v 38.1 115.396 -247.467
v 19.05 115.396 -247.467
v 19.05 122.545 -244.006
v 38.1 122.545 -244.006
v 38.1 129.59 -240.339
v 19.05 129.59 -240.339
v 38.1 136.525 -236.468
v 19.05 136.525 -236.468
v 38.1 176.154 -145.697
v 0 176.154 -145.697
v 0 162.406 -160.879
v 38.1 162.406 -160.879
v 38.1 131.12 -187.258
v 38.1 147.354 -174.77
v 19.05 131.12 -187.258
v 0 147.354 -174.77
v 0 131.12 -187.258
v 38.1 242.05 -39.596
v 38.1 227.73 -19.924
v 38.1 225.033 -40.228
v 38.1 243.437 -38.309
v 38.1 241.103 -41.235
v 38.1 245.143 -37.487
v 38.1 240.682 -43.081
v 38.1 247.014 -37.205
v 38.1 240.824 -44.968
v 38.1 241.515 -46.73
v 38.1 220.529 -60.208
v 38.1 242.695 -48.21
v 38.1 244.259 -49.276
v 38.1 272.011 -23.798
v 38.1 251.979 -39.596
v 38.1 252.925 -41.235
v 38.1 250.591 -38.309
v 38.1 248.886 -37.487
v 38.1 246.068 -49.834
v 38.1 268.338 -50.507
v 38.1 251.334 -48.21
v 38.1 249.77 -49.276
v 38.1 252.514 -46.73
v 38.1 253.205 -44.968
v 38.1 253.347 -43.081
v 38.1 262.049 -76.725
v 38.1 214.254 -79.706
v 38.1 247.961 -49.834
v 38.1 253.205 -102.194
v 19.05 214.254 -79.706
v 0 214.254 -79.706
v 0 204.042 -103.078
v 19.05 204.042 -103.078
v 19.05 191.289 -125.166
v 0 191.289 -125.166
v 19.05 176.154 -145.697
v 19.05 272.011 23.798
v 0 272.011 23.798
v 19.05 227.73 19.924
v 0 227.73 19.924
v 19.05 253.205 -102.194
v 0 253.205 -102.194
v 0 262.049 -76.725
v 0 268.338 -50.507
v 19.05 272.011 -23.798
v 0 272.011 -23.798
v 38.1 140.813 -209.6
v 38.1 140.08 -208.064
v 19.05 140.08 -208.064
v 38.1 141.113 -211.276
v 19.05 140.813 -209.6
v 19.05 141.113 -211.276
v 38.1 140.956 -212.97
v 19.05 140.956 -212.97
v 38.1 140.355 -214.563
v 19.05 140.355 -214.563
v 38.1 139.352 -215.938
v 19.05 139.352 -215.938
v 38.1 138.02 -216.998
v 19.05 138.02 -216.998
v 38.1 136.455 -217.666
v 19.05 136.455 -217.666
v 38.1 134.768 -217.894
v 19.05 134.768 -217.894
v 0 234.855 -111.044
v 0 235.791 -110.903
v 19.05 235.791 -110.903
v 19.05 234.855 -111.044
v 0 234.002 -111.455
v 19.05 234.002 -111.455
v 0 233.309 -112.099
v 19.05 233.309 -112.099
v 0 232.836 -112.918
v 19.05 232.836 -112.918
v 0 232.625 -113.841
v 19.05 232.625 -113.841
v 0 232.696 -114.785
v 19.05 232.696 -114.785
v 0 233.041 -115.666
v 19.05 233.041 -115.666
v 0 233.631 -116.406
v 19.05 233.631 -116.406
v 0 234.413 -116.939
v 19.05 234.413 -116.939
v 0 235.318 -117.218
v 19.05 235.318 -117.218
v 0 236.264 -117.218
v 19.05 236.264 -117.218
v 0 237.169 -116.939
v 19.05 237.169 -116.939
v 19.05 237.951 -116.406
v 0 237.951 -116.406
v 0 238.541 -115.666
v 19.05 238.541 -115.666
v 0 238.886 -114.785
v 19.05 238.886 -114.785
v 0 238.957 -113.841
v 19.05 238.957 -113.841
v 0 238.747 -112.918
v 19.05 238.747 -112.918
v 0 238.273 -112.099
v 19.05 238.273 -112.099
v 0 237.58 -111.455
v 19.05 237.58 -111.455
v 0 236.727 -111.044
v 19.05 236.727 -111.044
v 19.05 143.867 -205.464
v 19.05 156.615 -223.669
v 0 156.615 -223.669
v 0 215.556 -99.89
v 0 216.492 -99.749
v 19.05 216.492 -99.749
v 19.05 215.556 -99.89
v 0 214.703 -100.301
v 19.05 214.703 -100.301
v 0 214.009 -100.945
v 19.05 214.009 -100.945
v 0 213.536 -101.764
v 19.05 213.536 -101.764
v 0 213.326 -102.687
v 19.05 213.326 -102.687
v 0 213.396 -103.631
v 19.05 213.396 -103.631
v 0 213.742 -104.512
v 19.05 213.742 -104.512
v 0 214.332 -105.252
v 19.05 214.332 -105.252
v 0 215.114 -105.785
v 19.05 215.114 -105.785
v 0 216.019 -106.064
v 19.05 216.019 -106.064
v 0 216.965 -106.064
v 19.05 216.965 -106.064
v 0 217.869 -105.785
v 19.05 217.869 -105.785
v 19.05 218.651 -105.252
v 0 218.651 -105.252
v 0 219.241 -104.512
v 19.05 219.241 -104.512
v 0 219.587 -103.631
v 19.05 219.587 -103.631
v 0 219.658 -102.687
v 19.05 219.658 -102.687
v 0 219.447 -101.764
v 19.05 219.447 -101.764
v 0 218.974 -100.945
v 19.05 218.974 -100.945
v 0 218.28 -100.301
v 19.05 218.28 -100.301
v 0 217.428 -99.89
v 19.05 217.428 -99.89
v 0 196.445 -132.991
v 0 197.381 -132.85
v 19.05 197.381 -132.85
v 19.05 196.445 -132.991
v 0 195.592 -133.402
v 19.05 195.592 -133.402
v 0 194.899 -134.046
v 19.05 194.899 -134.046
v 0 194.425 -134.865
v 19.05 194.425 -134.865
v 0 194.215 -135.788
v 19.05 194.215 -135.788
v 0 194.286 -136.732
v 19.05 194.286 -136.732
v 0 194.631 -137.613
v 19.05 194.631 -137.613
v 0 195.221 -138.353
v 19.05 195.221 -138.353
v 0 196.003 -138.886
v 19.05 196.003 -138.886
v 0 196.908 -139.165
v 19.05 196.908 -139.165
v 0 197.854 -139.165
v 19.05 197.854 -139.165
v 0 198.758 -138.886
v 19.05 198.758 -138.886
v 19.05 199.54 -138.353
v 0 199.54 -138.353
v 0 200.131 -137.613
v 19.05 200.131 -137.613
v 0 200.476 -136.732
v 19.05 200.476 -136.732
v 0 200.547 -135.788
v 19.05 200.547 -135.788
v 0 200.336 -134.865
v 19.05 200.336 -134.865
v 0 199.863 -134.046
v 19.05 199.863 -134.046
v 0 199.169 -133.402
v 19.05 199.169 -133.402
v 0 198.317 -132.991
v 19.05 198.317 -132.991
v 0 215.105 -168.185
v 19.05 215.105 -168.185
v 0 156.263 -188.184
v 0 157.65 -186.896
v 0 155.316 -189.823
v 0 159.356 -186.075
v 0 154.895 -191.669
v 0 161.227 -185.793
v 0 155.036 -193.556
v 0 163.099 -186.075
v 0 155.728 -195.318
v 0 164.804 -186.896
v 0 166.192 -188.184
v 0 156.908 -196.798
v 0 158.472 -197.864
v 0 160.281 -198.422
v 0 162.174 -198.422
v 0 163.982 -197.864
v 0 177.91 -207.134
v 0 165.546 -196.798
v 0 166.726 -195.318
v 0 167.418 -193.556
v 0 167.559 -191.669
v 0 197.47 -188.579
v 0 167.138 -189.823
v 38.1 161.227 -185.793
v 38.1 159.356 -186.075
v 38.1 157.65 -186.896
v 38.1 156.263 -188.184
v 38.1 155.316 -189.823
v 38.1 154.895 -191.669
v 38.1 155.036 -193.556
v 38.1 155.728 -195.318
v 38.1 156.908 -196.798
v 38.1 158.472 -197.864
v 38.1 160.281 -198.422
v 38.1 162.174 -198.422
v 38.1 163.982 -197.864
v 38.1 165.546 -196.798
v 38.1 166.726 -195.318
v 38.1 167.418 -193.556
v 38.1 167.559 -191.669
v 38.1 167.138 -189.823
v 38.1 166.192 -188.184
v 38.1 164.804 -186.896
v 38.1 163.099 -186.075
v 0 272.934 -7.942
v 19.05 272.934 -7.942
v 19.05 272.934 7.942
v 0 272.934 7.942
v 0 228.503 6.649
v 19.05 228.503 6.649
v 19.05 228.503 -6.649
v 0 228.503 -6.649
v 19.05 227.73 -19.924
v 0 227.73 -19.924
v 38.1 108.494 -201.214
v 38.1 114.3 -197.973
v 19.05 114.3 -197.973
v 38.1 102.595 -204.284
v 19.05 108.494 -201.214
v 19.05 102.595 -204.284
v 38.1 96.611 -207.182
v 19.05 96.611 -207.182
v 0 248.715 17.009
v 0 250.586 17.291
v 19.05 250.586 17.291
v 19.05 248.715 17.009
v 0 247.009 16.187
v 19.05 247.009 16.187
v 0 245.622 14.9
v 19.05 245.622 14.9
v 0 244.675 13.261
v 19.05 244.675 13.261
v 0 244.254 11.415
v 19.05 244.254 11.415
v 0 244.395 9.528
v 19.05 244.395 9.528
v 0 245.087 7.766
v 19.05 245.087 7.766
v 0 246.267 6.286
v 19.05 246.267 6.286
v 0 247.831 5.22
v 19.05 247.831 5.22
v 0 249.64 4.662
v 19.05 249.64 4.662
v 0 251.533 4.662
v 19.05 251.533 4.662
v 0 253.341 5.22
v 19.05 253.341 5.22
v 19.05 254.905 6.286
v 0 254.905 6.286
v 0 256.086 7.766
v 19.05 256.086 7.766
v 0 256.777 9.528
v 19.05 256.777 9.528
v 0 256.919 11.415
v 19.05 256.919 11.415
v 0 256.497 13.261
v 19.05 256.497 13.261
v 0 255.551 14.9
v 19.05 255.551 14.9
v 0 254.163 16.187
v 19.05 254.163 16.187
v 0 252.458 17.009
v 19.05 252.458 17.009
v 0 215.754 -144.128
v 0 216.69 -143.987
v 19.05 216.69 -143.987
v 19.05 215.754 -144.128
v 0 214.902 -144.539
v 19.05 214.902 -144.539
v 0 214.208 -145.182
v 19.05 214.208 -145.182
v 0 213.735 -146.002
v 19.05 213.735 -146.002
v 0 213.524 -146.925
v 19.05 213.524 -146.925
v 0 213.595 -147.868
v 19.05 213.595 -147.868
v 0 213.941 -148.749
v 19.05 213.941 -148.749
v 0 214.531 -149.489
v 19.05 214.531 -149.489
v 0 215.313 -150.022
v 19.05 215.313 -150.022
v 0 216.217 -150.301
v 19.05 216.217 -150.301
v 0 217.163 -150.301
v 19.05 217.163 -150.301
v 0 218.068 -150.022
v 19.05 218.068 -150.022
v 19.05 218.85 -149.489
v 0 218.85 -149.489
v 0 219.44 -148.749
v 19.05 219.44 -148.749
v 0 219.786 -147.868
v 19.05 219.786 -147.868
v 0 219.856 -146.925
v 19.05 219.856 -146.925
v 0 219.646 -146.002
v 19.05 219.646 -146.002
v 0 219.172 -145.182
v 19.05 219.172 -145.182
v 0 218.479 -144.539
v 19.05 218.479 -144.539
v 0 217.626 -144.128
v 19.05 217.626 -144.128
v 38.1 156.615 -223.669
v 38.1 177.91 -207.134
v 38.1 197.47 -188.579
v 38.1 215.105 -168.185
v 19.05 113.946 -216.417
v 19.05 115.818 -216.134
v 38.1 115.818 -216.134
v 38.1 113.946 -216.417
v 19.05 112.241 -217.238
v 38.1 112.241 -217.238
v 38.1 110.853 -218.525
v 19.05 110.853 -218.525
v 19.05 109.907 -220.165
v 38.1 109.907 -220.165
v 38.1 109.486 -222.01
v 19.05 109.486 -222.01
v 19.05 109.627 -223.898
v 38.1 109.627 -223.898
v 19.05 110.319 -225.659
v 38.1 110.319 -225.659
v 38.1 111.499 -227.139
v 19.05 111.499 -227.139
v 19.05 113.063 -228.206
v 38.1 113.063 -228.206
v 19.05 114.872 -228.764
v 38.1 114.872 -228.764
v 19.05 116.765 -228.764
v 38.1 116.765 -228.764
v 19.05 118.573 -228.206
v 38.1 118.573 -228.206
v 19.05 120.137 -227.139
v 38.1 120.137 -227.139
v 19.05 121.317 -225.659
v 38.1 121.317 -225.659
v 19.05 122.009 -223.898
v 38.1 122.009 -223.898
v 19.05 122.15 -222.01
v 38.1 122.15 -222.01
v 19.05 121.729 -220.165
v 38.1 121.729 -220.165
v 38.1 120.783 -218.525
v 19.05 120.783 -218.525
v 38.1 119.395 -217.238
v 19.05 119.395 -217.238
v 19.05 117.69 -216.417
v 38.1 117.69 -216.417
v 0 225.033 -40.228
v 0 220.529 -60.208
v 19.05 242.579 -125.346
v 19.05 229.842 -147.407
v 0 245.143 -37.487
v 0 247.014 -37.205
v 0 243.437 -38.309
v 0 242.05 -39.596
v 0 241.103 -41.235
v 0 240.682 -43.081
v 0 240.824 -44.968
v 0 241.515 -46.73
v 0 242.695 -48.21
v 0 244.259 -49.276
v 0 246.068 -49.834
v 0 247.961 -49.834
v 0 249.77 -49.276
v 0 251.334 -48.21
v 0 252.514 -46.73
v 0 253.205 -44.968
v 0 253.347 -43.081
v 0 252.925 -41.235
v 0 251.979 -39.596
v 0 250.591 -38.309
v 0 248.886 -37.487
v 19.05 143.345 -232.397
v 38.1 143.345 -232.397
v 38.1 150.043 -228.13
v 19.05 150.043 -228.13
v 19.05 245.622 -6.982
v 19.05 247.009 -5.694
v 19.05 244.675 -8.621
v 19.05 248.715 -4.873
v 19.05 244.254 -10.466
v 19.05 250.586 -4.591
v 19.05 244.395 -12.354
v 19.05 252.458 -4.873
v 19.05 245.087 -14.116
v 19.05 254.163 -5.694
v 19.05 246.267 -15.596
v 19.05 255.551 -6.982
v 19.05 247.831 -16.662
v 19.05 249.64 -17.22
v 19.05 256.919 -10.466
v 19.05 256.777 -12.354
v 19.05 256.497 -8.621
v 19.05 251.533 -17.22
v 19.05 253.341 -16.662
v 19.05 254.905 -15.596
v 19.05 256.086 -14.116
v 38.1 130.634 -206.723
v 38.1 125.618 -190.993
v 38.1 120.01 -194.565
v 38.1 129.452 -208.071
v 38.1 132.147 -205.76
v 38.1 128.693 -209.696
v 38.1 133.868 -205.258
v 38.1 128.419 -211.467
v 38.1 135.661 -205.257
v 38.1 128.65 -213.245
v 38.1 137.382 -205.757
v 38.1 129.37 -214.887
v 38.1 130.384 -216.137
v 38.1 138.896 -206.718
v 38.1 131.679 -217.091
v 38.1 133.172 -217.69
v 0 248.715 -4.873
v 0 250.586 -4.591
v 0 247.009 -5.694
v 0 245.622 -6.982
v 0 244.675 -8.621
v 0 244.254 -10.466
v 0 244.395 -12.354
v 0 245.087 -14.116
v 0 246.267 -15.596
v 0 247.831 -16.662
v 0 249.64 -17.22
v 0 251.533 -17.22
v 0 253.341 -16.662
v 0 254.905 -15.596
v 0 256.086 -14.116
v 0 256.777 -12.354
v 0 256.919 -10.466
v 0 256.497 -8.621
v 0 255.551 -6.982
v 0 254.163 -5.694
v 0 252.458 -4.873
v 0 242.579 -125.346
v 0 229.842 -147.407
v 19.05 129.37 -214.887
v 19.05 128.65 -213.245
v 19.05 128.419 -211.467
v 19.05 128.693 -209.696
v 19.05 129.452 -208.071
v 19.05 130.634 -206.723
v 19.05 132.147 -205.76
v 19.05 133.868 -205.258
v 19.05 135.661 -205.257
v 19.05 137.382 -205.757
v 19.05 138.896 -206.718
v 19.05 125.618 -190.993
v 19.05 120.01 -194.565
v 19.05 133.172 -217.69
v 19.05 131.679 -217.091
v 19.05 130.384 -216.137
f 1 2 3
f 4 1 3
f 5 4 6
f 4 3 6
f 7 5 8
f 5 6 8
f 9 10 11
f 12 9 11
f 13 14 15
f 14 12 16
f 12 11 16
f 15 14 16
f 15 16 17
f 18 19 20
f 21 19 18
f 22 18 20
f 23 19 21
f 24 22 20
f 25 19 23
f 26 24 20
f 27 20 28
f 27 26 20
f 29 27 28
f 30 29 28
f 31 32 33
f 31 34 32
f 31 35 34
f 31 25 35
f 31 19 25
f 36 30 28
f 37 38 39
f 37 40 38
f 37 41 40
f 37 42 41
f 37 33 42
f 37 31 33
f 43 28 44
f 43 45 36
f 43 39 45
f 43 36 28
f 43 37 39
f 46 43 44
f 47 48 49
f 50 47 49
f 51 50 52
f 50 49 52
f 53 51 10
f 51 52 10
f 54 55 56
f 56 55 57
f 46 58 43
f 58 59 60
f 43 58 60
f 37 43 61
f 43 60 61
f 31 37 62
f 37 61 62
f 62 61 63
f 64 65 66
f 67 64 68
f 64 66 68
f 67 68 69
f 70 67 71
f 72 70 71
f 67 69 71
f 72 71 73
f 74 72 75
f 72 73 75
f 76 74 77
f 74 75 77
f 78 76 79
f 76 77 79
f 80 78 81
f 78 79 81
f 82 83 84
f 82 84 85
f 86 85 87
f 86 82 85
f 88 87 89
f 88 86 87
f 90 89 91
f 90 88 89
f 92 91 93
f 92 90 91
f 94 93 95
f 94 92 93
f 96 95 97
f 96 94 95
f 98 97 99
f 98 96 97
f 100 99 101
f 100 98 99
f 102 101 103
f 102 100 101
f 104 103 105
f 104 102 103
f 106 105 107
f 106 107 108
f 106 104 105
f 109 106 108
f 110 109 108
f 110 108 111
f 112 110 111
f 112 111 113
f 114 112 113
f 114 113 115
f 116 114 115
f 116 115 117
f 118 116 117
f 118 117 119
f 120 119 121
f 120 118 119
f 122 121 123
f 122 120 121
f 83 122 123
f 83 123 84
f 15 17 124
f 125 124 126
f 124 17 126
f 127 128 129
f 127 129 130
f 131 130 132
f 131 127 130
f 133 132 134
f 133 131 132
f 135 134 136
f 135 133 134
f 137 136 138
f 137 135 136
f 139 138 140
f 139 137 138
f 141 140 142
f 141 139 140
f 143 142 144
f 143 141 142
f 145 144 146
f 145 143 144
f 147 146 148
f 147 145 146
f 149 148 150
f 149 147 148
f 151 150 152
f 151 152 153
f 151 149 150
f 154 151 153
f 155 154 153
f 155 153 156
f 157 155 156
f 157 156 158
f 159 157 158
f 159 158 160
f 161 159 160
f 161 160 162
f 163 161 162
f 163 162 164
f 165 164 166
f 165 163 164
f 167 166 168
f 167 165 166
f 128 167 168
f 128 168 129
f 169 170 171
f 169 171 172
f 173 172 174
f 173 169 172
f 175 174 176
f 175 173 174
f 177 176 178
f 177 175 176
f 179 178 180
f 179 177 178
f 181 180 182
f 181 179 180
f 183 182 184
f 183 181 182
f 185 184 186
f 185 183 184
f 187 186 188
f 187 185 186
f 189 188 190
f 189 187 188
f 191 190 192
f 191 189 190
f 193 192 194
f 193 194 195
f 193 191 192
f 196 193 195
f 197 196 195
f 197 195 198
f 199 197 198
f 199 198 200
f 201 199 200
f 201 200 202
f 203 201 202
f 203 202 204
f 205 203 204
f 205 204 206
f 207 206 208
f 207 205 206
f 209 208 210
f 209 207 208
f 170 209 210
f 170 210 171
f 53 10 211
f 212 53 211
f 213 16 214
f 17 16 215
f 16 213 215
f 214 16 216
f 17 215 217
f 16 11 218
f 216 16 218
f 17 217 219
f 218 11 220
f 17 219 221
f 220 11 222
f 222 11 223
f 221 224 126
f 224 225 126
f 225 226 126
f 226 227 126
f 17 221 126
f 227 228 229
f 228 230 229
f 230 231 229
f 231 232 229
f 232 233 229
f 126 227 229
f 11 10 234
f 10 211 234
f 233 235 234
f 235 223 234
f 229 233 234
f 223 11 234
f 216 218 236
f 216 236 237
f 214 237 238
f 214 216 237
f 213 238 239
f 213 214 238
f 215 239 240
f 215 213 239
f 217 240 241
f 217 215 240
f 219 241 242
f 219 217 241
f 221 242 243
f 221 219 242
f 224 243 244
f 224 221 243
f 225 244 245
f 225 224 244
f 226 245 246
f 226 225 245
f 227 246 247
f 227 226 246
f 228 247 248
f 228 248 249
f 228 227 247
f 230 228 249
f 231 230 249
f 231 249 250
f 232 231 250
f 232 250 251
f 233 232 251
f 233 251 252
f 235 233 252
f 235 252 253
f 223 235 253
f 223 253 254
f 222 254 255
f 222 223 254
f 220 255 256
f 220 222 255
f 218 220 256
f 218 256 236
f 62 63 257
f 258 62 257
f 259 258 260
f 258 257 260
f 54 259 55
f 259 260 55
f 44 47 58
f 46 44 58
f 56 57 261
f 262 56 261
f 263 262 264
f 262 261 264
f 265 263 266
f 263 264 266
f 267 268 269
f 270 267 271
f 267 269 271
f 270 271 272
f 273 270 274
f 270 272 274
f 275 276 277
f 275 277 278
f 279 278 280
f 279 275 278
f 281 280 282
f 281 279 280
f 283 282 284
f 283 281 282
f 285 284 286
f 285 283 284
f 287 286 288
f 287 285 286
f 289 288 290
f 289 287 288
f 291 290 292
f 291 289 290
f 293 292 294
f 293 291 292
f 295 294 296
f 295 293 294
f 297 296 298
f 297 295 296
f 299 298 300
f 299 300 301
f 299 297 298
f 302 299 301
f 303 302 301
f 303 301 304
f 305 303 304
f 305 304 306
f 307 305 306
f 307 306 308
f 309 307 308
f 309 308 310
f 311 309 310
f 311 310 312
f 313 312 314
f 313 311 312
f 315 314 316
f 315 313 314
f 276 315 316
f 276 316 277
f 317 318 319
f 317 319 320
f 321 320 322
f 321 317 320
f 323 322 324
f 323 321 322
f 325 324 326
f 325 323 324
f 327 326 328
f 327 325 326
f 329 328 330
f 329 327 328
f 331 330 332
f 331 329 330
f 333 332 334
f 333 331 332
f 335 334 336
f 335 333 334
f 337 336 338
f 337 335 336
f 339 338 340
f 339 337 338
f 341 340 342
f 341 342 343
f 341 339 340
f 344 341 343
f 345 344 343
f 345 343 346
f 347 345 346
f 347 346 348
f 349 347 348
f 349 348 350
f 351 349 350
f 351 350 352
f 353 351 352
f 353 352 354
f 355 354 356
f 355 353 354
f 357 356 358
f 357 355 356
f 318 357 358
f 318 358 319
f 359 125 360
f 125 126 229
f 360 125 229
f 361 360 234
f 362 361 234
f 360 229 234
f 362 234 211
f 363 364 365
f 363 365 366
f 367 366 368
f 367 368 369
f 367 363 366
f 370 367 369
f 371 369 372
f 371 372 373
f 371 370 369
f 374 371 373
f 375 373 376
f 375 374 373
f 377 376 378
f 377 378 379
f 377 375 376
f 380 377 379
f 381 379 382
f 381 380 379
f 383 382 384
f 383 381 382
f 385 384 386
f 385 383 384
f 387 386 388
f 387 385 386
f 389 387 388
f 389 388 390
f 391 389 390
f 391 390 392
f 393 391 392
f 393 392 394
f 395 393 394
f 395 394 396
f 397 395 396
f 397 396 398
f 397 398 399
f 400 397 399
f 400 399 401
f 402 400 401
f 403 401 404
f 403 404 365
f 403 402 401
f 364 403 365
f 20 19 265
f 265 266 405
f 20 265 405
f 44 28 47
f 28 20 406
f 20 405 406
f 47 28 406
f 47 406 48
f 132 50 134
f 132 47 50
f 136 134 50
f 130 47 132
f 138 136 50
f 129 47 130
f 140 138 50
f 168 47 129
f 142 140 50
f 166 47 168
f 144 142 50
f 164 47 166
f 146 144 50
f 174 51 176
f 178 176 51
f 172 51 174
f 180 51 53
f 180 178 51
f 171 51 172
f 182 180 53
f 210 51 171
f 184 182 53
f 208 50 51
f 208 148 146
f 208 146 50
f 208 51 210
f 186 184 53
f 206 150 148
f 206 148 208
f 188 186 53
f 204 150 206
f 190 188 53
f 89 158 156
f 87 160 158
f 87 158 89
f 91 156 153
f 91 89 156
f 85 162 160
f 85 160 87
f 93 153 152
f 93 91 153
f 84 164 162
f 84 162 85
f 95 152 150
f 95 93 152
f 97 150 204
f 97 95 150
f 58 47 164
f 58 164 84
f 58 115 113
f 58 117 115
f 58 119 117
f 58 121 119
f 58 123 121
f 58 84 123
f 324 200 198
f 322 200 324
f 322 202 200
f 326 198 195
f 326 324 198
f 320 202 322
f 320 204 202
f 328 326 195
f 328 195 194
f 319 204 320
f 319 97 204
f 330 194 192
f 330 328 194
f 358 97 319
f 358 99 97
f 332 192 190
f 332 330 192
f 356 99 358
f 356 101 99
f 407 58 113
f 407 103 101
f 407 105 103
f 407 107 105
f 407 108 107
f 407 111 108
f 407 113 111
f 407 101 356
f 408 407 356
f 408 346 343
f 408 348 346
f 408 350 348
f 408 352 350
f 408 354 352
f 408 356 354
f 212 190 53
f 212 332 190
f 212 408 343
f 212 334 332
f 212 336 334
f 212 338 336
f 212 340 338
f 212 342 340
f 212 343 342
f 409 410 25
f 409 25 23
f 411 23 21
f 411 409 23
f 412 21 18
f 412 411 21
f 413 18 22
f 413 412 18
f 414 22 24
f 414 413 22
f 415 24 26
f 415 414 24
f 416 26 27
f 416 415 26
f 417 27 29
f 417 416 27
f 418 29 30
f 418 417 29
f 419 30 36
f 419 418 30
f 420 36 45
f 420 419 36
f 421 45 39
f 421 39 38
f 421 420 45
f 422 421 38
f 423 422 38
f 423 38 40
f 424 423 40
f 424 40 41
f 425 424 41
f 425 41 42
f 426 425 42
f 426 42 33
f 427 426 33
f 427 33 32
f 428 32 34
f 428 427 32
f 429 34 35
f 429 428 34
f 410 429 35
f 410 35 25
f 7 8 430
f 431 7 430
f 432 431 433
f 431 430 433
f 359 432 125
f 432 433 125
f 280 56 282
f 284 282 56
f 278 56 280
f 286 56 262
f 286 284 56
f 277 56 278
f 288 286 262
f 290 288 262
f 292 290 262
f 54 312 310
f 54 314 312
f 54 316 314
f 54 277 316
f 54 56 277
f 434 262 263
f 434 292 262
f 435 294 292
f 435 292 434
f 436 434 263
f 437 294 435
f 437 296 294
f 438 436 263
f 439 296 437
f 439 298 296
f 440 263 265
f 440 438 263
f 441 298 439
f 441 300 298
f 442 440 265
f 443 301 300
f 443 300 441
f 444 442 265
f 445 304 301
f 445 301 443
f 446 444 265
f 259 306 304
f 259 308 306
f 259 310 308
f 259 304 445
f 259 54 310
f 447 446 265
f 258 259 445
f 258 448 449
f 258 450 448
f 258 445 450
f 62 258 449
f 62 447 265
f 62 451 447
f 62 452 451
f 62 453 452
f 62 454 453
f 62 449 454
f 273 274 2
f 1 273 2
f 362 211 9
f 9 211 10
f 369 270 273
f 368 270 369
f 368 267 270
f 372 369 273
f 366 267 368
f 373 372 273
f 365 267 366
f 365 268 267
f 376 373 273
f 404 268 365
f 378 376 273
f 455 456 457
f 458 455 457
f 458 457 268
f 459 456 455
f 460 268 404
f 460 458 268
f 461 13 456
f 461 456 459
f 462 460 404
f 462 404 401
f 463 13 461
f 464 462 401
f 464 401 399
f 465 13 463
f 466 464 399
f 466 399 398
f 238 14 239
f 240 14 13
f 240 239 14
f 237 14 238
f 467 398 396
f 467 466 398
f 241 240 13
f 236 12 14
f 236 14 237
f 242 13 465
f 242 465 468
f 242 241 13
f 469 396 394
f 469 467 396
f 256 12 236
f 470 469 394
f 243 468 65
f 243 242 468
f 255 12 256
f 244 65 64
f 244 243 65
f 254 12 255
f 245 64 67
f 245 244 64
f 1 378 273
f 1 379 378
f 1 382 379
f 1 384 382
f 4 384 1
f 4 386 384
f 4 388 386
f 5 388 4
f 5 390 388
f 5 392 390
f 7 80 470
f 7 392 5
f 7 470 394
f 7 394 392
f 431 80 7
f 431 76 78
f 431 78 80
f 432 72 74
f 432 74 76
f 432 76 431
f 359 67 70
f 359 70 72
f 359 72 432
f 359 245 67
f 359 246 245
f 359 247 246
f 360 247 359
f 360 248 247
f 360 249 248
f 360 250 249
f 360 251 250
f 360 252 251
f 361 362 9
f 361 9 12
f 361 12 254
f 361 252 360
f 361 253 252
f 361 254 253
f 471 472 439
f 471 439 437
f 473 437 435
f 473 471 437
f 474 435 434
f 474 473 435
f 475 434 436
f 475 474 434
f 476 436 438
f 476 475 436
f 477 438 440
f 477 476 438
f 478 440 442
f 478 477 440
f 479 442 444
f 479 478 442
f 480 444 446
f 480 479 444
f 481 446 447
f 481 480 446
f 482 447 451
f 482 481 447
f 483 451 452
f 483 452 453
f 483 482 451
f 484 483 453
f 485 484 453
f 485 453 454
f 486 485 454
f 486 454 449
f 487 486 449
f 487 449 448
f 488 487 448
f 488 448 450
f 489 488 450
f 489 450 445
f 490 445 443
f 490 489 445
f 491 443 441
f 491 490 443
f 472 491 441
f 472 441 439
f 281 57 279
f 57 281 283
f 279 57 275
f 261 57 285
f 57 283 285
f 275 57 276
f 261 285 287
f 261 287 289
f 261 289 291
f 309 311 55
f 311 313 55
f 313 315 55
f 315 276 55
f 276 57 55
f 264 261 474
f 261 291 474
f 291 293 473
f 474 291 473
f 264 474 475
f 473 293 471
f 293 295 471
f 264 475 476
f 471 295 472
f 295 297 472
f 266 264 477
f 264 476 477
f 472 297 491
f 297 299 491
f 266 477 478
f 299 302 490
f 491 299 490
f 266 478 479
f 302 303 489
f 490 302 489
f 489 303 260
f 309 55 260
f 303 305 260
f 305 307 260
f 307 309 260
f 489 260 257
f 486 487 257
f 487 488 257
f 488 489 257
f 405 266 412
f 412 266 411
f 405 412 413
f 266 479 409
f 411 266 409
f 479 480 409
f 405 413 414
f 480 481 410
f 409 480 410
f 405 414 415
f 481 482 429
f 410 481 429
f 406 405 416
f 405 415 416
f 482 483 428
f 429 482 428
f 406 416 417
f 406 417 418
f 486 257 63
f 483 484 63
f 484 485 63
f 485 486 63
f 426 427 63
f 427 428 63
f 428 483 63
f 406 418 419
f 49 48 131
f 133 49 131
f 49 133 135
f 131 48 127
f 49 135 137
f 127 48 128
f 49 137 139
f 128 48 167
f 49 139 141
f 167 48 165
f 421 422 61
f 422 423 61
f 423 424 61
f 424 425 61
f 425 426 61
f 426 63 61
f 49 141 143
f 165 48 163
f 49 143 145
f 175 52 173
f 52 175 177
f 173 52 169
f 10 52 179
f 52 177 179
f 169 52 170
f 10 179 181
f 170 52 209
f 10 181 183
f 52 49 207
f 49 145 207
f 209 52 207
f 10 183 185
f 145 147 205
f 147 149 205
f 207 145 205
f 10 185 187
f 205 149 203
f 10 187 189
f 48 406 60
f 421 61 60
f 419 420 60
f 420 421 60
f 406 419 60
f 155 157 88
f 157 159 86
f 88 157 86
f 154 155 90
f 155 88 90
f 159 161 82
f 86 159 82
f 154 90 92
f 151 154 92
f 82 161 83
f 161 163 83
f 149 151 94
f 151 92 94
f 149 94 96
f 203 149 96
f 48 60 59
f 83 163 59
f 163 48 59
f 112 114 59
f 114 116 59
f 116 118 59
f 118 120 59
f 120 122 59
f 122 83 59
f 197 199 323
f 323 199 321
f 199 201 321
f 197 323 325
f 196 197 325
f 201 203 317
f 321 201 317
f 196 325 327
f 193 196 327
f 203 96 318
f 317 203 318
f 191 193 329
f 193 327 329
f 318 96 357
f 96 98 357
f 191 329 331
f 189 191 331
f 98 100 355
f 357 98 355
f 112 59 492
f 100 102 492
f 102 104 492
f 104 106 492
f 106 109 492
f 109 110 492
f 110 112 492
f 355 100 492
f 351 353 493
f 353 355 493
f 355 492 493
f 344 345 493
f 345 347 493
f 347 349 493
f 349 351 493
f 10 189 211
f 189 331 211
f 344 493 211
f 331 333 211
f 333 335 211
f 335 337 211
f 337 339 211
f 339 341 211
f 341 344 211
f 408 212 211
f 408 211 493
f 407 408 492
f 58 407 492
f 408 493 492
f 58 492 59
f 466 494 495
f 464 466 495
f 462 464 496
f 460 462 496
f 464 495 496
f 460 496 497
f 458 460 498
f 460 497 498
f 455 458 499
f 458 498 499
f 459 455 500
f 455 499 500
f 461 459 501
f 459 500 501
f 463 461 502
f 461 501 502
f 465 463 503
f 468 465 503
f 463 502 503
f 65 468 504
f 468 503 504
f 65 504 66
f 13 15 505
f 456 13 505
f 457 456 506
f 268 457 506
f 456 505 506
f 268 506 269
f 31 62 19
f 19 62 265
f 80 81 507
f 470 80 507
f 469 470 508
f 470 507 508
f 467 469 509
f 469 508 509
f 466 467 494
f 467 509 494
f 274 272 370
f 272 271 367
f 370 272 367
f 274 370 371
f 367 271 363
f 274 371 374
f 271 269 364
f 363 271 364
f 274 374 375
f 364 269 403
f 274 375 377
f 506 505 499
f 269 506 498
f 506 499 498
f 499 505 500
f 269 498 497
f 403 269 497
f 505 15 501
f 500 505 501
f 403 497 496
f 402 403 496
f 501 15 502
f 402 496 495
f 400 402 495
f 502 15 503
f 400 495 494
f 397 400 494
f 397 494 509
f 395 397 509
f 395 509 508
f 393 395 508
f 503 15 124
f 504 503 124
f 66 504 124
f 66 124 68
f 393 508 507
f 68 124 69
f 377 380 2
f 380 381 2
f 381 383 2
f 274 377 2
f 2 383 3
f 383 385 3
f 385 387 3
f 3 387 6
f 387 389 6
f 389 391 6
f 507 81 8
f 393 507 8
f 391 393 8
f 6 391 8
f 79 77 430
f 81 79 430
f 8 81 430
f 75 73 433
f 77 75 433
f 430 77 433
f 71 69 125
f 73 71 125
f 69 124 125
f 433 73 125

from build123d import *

# Parameters (mm, degrees)
SKETCH1_R             = 6.35
BOSS_EXTRUDE9_DEPTH   = 38.1
BOSS_EXTRUDE9_2_DEPTH = 38.1
SKETCH1_8_R           = 6.35
SKETCH1_8_R_2         = 3.175
BOSS_EXTRUDE10_DEPTH  = 19.05
BOSS_EXTRUDE12_START  = 19.05
SKETCH1_10_R          = 6.35
BOSS_EXTRUDE12_DEPTH  = 19.05


with BuildPart() as part:
    # Sketch1 → Boss-Extrude9 (new body)
    with BuildSketch(Plane(origin=(0, 0, 0), x_dir=(0, 0, -1), z_dir=(1, 0, 0))):
        with BuildLine():
            ThreePointArc((19.923802792, 227.730107984), (50.268386101, 223.004594928), (79.705751984, 214.254412092))
            Line((79.705751984, 214.254412092), (102.193829352, 253.204904657))
            ThreePointArc((102.193829352, 253.204904657), (63.69375462, 265.517246375), (23.797875557, 272.010962314))
            Line((23.797875557, 272.010962314), (19.923802792, 227.730107984))
        make_face()
        with Locations(Location((43.555304163, 247.014404649, 0), (0, 0, 180))):
            Circle(SKETCH1_R, mode=Mode.SUBTRACT)
    extrude(amount=BOSS_EXTRUDE9_DEPTH)

    # Sketch1<8> → Boss-Extrude10 (add)
    # profile 1 of 2: a face of its own
    with BuildSketch(Plane(origin=(0, 0, 0), x_dir=(0, 0, -1), z_dir=(1, 0, 0))):
        with BuildLine():
            ThreePointArc((-19.923802792, 227.730107984), (0, 228.6), (19.923802792, 227.730107984))
            Line((19.923802792, 227.730107984), (23.797875557, 272.010962314))
            ThreePointArc((23.797875557, 272.010962314), (0, 273.05), (-23.797875557, 272.010962314))
            Line((-23.797875557, 272.010962314), (-19.923802792, 227.730107984))
        make_face()
        with Locations(Location((10.940832836, 250.586270178, 0), (0, 0, 180))):
            Circle(SKETCH1_8_R, mode=Mode.SUBTRACT)
        with Locations(Location((-10.940832836, 250.586270178, 0), (0, 0, 180))):
            Circle(SKETCH1_8_R, mode=Mode.SUBTRACT)
    # profile 2 of 2: a face of its own
    with BuildSketch(Plane(origin=(0, 0, 0), x_dir=(0, 0, -1), z_dir=(1, 0, 0))):
        with BuildLine():
            Line((102.193829352, 253.204904657), (79.705751984, 214.254412092))
            ThreePointArc((79.705751984, 214.254412092), (114.3, 197.973407305), (145.696887752, 176.154412092))
            Line((145.696887752, 176.154412092), (168.18496512, 215.104904657))
            ThreePointArc((168.18496512, 215.104904657), (136.525, 236.468236503), (102.193829352, 253.204904657))
        make_face()
        with Locations(Location((102.924280642, 216.491743747, 0), (0, 0, 180))):
            Circle(SKETCH1_8_R_2, mode=Mode.SUBTRACT)
        with Locations(Location((114.078247165, 235.791024914, 0), (0, 0, 180))):
            Circle(SKETCH1_8_R_2, mode=Mode.SUBTRACT)
        with Locations(Location((147.161893977, 216.690172521, 0), (0, 0, 180))):
            Circle(SKETCH1_8_R_2, mode=Mode.SUBTRACT)
        with Locations(Location((136.025209473, 197.380913576, 0), (0, 0, 180))):
            Circle(SKETCH1_8_R_2, mode=Mode.SUBTRACT)
    extrude(amount=BOSS_EXTRUDE10_DEPTH)


with BuildPart() as body_2:
    # Sketch1 → Boss-Extrude9 2 (new body)
    with BuildSketch(Plane(origin=(0, 0, 0), x_dir=(0, 0, -1), z_dir=(1, 0, 0))):
        with BuildLine():
            ThreePointArc((145.696887752, 176.154412092), (167.993451318, 155.035996834), (187.258157324, 131.11957335))
            Line((187.258157324, 131.11957335), (223.669465693, 156.615045946))
            ThreePointArc((223.669465693, 156.615045946), (198.097803193, 187.919032751), (168.18496512, 215.104904657))
            Line((168.18496512, 215.104904657), (145.696887752, 176.154412092))
        make_face()
        with Locations(Location((192.143097445, 161.2272022, 0), (0, 0, 180))):
            Circle(SKETCH1_R, mode=Mode.SUBTRACT)
    extrude(amount=BOSS_EXTRUDE9_2_DEPTH)

    # Sketch1<10> → Boss-Extrude12 (add)
    # profile 1 of 3: a face of its own
    with BuildSketch(Plane(origin=(0, 0, 0), x_dir=(0, 0, -1), z_dir=(1, 0, 0)).offset(BOSS_EXTRUDE12_START)):
        with BuildLine():
            ThreePointArc((214.887446965, 129.369879654), (216.063194968, 127.396532155), (217.220821904, 125.4125))
            Line((217.220821904, 125.4125), (236.468236503, 136.525))
            ThreePointArc((236.468236503, 136.525), (230.288034279, 146.709658059), (223.669465693, 156.615045946))
            Line((223.669465693, 156.615045946), (205.463811509, 143.867309648))
            ThreePointArc((205.463811509, 143.867309648), (206.772721017, 141.97965512), (208.064288645, 140.08009286))
            ThreePointArc((208.064288645, 140.08009286), (214.562640659, 140.354608917), (217.893659396, 134.768174264))
            ThreePointArc((217.893659396, 134.768174264), (217.091431519, 131.678720515), (214.887446965, 129.369879654))
        make_face()
    # profile 2 of 3: a face of its own
    with BuildSketch(Plane(origin=(0, 0, 0), x_dir=(0, 0, -1), z_dir=(1, 0, 0)).offset(BOSS_EXTRUDE12_START)):
        with BuildLine():
            ThreePointArc((187.258157324, 131.11957335), (192.799284513, 122.826690468), (197.973407305, 114.3))
            Line((197.973407305, 114.3), (217.220821904, 125.4125))
            ThreePointArc((217.220821904, 125.4125), (216.063194968, 127.396532155), (214.887446965, 129.369879654))
            ThreePointArc((214.887446965, 129.369879654), (206.188123715, 131.356321751), (208.064288645, 140.08009286))
            ThreePointArc((208.064288645, 140.08009286), (206.772721017, 141.97965512), (205.463811509, 143.867309648))
            Line((205.463811509, 143.867309648), (187.258157324, 131.11957335))
        make_face()
    # profile 3 of 3: a face of its own
    with BuildSketch(Plane(origin=(0, 0, 0), x_dir=(0, 0, -1), z_dir=(1, 0, 0)).offset(BOSS_EXTRUDE12_START)):
        with BuildLine():
            ThreePointArc((197.973407305, 114.3), (202.770676465, 105.555732986), (207.181960117, 96.610534634))
            Line((207.181960117, 96.610534634), (247.46734125, 115.395916368))
            ThreePointArc((247.46734125, 115.395916368), (242.198307999, 126.080458844), (236.468236503, 136.525))
            Line((236.468236503, 136.525), (217.220821904, 125.4125))
            Line((217.220821904, 125.4125), (197.973407305, 114.3))
        make_face()
        with Locations(Location((222.484492232, 115.818095915, 0), (0, 0, 180))):
            Circle(SKETCH1_10_R, mode=Mode.SUBTRACT)
    extrude(amount=BOSS_EXTRUDE12_DEPTH)


solid = Compound([part.part, body_2.part])
